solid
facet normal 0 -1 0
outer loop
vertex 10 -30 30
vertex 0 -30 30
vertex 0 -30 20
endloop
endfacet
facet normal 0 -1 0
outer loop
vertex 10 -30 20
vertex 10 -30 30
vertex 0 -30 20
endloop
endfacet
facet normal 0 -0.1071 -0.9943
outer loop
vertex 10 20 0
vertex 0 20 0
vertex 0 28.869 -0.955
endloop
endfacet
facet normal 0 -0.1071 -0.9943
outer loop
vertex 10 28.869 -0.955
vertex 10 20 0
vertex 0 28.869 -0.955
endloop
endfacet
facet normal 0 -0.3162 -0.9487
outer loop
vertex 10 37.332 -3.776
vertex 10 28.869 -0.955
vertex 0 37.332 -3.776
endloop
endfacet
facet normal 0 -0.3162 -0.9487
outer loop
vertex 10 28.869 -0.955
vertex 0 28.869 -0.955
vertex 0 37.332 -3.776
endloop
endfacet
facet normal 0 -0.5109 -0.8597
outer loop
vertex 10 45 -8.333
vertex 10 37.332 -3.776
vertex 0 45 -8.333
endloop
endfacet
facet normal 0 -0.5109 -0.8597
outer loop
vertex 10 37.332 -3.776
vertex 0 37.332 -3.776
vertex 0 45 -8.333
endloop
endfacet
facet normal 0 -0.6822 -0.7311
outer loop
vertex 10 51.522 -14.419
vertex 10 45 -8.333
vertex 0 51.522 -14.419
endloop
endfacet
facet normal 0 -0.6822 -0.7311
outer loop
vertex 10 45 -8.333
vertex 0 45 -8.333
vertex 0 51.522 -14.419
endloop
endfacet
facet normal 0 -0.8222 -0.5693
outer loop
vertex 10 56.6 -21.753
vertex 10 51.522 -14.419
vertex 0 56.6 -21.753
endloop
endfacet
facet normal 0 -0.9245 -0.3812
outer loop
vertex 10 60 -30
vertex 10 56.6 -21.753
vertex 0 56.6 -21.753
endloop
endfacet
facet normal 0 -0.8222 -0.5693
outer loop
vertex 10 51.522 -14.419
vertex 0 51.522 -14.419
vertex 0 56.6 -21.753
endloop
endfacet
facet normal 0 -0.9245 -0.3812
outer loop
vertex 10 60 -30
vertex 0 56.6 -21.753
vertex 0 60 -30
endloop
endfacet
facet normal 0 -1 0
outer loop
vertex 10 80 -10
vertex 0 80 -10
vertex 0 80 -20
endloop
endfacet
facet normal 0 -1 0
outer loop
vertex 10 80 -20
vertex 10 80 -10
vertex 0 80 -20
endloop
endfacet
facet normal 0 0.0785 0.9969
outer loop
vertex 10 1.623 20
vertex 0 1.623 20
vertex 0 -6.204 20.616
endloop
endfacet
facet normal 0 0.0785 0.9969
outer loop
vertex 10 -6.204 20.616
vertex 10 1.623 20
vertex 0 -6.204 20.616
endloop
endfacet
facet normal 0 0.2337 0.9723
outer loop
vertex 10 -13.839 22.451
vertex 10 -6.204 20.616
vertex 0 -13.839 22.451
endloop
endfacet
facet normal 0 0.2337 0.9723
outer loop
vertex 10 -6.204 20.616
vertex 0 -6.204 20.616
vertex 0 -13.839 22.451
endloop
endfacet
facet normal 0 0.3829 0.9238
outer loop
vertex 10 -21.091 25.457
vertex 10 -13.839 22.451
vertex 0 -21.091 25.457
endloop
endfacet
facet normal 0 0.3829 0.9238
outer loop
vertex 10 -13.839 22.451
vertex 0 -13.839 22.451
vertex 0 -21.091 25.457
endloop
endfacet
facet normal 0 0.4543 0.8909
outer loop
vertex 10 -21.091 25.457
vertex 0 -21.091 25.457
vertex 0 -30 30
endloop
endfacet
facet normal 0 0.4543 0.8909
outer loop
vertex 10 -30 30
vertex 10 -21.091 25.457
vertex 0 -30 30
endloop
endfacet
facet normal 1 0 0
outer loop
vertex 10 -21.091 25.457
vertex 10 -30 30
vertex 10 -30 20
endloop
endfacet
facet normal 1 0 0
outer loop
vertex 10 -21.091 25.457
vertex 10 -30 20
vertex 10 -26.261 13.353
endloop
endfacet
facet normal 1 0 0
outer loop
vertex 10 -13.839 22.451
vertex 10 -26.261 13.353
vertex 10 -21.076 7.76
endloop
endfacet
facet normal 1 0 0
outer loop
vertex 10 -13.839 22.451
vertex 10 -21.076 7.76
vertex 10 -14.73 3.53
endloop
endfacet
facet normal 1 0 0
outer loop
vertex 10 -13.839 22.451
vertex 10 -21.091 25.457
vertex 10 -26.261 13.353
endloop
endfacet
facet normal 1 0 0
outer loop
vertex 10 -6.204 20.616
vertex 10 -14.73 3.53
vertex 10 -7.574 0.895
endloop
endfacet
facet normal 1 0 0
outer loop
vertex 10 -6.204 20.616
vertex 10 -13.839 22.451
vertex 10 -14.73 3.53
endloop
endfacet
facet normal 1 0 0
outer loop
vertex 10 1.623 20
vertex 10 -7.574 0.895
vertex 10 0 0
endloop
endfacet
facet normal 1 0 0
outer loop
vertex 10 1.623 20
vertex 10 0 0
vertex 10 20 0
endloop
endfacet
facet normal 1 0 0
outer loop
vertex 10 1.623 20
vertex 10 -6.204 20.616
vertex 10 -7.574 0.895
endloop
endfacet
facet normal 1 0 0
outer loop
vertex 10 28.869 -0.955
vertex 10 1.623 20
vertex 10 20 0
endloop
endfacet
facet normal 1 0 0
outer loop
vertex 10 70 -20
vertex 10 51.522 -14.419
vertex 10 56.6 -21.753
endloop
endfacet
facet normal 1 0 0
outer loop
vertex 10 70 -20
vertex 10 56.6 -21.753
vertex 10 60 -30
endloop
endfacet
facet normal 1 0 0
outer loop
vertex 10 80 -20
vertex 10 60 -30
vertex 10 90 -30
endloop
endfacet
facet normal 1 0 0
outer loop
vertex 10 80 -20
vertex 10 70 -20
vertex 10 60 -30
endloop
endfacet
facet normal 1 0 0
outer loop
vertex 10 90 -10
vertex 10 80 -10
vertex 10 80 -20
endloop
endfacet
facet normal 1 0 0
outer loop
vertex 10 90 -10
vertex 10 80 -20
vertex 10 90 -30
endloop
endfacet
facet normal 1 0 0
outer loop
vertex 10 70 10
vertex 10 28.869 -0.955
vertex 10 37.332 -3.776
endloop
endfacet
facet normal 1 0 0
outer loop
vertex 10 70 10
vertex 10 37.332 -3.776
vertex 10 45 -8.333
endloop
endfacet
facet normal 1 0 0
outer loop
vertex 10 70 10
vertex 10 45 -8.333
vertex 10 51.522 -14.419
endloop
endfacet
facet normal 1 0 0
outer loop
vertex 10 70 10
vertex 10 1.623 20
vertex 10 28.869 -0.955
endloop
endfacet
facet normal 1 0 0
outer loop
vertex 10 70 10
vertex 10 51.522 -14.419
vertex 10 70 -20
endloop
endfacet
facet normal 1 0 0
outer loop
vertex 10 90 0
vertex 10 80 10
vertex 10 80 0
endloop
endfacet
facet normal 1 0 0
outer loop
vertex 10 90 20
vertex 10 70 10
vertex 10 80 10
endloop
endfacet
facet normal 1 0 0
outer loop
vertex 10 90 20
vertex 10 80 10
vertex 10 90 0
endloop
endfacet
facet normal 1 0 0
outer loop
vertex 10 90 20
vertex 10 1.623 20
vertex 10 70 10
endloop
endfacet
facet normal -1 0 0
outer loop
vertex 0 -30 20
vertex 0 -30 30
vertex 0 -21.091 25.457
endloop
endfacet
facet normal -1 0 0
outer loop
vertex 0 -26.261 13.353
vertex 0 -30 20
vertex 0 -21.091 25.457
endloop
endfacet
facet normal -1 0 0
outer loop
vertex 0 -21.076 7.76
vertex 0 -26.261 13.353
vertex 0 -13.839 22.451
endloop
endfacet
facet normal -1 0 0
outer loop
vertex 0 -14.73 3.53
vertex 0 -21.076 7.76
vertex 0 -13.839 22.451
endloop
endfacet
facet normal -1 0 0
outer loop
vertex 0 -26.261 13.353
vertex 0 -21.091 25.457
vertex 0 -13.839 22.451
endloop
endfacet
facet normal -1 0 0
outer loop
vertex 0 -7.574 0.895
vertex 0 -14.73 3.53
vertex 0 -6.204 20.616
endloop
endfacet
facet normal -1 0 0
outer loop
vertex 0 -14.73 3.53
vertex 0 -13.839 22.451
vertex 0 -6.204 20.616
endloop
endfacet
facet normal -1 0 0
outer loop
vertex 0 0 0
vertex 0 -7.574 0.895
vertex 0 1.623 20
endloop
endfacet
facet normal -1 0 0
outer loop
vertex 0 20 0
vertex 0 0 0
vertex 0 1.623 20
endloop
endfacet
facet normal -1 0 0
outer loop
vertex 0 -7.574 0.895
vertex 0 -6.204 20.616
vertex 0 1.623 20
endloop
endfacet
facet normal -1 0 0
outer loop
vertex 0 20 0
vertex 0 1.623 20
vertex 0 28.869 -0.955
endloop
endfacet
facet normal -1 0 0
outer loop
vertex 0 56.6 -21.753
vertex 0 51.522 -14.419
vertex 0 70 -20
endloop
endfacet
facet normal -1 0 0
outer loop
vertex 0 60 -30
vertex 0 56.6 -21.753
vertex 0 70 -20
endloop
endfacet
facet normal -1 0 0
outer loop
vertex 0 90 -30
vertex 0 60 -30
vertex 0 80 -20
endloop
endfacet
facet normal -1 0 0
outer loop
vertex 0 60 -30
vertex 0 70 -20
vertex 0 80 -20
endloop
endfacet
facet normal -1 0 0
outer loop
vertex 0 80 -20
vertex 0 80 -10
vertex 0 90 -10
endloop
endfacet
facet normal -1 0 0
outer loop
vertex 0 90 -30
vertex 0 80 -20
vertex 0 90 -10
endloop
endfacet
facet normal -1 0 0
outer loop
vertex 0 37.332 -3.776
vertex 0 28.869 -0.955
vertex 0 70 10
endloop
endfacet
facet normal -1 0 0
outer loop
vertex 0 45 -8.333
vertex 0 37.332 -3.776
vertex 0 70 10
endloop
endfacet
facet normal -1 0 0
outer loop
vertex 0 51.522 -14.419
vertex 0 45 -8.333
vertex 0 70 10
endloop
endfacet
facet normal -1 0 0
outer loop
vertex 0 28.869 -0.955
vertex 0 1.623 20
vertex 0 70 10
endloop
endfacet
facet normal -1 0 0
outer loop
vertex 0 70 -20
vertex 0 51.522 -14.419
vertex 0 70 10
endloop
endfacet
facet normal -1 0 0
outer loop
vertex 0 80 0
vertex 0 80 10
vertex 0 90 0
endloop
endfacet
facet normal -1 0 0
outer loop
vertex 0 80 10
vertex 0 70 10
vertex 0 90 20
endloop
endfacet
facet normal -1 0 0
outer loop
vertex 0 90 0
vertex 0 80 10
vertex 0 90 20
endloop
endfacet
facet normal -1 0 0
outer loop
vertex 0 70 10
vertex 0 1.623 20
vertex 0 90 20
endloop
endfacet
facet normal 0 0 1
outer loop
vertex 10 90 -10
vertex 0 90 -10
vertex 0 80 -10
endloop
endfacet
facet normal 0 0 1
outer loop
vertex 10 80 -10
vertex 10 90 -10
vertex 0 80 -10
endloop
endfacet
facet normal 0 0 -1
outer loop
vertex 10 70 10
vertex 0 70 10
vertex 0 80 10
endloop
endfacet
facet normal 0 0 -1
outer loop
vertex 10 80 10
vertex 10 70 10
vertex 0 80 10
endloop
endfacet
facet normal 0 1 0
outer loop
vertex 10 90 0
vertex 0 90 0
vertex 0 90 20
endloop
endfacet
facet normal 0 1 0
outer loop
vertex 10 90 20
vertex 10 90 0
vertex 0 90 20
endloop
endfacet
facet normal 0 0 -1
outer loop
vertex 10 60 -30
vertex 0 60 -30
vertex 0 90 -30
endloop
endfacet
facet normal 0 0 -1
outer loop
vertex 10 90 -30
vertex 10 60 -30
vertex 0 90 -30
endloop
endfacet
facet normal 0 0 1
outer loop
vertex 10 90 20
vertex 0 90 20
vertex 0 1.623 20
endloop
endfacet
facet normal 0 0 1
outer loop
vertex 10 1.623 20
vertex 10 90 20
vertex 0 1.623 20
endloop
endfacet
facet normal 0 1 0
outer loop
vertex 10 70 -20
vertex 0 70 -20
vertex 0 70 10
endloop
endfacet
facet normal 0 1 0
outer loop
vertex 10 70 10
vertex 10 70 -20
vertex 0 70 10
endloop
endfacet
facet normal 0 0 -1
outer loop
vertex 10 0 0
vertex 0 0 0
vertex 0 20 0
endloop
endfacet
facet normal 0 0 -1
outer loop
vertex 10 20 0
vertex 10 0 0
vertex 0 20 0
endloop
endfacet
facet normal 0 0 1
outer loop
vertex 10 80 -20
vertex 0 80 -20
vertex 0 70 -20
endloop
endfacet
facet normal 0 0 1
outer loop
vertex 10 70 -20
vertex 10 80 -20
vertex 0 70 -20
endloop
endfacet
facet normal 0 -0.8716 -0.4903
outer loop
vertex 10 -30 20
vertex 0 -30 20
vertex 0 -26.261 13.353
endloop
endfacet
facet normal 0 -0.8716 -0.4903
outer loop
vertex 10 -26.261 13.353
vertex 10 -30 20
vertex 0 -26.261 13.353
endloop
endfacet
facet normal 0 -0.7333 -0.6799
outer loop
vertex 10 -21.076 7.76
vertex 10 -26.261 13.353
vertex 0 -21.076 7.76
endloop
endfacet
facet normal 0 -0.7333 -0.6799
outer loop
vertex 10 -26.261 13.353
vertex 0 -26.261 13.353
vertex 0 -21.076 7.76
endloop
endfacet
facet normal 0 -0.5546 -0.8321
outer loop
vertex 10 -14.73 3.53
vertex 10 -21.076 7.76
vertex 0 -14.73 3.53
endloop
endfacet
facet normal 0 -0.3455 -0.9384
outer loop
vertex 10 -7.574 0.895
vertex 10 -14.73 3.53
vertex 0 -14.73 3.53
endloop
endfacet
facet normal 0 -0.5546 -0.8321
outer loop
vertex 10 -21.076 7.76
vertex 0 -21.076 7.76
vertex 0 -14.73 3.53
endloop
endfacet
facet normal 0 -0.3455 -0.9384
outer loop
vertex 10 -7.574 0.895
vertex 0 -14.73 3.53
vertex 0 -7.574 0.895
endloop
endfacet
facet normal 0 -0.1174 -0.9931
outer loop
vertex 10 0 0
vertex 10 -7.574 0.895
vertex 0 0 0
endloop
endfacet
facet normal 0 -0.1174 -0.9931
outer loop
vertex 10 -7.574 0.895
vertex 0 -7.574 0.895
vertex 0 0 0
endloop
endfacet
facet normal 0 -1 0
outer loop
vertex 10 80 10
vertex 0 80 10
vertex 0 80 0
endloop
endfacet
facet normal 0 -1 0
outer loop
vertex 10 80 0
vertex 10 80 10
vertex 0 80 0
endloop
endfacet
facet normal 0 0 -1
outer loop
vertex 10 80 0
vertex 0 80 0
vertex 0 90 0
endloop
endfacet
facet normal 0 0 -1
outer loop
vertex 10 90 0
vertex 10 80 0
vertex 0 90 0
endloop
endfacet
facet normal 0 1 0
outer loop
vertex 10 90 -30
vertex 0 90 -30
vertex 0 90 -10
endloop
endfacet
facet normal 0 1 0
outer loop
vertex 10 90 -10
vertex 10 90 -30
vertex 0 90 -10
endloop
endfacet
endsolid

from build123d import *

# Parameters (mm, degrees)
F1_DEPTH = 10


with BuildPart() as f1:
    # F0 (on Right) → F1 (new body)
    with BuildSketch(Plane.YZ):
        with BuildLine():
            Line((-21.091432, 25.457158), (-30, 30))
            Line((-30, 30), (-30, 20))
            ThreePointArc((-30, 20), (-18.027756, 5.458365), (0, 0))
            Line((0, 0), (20, 0))
            ThreePointArc((20, 0), (45, -8.333333), (60, -30))
            Line((60, -30), (70, -30))
            Line((70, -30), (70, -20))
            Line((70, -20), (70, 10))
            Line((70, 10), (70, 20))
            Line((70, 20), (1.622777, 20))
            ThreePointArc((1.622777, 20), (-10.057504, 21.383428), (-21.091432, 25.457158))
        make_face()
        Polygon((90, 20), (70, 20), (70, 10), (80, 10), (80, 0), (90, 0), align=None)
        Polygon((80, -20), (70, -20), (70, -30), (90, -30), (90, -10), (80, -10), align=None)
    extrude(amount=F1_DEPTH)


solid = f1.part
